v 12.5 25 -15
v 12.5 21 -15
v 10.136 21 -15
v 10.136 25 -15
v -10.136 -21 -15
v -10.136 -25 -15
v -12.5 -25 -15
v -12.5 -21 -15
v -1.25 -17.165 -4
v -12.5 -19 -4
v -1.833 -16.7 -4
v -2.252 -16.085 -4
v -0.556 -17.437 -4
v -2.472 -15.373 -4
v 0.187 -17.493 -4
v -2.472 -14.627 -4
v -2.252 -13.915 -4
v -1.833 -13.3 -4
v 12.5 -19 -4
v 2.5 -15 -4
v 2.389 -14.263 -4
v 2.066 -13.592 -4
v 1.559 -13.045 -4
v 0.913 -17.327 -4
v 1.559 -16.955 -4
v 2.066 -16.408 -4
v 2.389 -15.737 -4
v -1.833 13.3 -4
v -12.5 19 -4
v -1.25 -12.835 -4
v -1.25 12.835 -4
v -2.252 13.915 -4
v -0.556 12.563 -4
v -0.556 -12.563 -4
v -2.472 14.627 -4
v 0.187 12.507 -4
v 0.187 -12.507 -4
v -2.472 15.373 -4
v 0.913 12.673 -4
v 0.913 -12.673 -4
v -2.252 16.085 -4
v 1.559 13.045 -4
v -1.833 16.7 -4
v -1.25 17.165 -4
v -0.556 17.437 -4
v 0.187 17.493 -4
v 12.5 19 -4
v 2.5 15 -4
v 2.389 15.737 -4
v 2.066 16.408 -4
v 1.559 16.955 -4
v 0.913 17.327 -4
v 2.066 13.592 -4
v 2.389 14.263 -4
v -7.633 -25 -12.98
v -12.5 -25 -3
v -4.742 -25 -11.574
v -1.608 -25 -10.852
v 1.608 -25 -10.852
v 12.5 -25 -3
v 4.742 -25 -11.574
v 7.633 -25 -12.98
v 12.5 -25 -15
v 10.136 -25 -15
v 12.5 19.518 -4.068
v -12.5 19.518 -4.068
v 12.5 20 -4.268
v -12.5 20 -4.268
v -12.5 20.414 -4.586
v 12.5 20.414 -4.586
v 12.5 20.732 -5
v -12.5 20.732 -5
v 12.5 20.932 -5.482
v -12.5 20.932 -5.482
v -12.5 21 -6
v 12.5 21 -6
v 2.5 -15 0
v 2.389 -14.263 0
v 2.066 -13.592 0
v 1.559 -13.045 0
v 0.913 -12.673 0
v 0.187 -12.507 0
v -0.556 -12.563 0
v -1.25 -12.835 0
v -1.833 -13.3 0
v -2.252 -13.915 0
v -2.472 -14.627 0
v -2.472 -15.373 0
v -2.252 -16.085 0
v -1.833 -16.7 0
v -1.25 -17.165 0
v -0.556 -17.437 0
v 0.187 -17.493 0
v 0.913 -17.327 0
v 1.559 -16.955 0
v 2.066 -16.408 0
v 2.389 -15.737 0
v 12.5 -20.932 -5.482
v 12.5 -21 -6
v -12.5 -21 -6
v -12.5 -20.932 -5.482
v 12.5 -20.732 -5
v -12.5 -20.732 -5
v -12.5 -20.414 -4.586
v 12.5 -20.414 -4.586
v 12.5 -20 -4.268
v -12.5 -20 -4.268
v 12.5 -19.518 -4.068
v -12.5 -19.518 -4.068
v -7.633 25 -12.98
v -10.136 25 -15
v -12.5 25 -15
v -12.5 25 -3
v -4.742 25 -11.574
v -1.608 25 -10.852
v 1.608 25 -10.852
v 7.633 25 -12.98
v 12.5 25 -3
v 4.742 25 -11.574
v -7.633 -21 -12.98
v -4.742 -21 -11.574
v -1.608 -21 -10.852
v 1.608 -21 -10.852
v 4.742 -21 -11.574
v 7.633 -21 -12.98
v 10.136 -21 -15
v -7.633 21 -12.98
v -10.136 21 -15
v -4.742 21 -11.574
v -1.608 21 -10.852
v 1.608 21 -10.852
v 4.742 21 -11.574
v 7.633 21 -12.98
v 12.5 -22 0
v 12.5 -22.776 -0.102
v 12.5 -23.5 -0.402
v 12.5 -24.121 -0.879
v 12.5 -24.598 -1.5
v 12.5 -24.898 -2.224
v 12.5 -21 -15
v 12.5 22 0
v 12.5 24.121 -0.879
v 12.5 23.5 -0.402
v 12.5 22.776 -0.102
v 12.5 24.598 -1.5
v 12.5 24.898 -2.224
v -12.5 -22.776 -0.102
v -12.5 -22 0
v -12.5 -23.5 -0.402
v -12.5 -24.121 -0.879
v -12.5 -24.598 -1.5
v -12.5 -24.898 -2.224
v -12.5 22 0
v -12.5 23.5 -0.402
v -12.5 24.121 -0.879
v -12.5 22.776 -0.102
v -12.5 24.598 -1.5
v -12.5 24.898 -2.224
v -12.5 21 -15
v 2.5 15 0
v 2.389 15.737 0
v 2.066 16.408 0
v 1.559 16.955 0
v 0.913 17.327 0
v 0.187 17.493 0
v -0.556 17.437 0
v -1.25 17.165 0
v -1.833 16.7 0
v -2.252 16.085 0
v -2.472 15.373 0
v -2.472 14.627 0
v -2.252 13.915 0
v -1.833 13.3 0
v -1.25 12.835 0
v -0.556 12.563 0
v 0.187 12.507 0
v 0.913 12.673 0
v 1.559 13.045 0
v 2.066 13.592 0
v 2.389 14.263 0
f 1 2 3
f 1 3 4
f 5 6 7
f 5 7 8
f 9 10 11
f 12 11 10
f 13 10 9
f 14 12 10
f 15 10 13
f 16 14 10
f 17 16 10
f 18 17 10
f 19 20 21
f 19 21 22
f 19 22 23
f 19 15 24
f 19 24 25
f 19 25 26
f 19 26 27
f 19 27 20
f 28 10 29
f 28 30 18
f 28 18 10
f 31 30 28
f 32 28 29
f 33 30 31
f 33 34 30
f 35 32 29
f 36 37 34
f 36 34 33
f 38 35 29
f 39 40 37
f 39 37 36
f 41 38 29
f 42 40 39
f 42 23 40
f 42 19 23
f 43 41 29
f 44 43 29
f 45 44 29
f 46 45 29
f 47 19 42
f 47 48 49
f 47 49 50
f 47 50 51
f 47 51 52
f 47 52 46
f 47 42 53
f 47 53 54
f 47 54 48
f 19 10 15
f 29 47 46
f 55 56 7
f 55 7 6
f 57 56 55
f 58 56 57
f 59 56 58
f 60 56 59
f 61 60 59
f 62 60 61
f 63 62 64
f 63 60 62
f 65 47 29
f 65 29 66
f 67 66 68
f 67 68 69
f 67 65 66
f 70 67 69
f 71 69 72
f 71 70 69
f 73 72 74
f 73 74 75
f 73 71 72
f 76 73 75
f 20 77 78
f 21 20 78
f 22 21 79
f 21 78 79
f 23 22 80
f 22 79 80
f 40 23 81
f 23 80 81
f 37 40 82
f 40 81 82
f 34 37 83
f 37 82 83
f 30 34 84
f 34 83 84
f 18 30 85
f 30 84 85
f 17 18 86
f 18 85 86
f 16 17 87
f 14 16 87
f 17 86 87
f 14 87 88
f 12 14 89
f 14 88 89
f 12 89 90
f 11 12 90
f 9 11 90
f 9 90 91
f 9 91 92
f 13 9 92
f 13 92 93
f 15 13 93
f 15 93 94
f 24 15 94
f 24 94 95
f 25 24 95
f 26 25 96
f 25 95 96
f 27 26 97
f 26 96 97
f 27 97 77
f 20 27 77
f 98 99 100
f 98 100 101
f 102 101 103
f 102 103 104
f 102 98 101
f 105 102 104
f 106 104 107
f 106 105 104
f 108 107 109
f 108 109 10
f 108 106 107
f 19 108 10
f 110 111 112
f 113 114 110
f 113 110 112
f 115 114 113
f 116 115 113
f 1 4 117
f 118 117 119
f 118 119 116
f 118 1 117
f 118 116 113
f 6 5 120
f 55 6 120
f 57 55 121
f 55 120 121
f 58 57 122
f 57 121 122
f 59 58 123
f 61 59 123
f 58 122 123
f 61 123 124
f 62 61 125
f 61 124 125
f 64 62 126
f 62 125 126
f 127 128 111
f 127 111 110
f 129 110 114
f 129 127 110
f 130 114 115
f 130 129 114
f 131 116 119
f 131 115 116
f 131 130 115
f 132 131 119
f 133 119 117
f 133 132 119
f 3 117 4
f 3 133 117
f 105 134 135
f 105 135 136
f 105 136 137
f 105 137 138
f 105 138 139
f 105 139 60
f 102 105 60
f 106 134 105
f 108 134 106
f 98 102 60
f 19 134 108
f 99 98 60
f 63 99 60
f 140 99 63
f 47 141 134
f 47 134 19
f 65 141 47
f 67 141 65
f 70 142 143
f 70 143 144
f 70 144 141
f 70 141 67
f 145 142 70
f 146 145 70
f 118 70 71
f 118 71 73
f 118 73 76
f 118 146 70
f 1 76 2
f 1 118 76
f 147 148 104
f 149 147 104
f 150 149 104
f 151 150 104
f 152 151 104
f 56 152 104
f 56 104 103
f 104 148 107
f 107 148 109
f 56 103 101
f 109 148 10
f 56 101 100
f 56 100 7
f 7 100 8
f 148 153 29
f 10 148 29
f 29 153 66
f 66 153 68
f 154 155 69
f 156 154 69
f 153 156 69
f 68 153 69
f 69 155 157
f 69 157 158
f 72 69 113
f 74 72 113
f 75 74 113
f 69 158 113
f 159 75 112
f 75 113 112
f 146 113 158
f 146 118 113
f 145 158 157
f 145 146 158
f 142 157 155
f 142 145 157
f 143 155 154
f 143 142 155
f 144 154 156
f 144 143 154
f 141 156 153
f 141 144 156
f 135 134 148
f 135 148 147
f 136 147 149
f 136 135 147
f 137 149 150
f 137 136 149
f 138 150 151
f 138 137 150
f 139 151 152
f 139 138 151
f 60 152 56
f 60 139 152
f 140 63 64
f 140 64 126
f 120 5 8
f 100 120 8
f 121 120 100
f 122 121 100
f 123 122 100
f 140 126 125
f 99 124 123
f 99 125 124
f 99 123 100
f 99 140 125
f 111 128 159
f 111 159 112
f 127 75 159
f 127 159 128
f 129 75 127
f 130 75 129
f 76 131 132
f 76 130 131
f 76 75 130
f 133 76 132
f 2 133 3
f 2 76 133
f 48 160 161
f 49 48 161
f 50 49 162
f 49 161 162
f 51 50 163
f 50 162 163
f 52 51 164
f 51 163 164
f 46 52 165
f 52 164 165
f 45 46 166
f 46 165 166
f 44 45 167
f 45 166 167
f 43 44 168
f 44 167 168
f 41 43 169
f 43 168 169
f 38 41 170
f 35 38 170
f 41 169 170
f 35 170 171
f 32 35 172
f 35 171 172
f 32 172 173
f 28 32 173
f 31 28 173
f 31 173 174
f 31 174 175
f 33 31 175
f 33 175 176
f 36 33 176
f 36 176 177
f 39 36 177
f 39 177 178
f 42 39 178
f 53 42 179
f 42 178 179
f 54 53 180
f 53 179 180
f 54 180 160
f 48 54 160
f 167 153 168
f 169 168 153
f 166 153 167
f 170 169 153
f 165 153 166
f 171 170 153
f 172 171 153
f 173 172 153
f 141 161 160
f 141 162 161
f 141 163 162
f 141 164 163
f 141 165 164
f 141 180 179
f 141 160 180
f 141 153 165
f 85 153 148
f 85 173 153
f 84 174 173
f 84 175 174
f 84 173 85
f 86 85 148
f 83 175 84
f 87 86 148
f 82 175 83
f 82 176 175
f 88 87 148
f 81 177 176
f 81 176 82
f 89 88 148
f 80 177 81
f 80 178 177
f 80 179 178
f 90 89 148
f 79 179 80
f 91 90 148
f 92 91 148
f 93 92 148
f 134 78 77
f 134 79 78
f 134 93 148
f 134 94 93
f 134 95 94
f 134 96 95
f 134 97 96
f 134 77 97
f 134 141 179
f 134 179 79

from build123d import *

# Parameters (mm, degrees)
BOSS_EXTRUDE3_DEPTH     = 12.5
SKETCH2_R               = 2.5
CUT_EXTRUDE3_DEPTH      = 4
SKETCH3_R               = 14.238624177
CUT_EXTRUDE4_DEPTH      = 26
CUT_EXTRUDE4_DEPTH_BACK = 26


with BuildPart() as part:
    # Sketch1 → Boss-Extrude3 (new body, symmetric)
    with BuildSketch(Plane(origin=(0, 0, 0), x_dir=(0, 0, -1), z_dir=(1, 0, 0))):
        with BuildLine():
            Line((0, 22), (0, -22))
            ThreePointArc((0, -22), (0.878679656, -24.121320344), (3, -25))
            Line((3, -25), (15, -25))
            Line((15, -25), (15, -21))
            Line((15, -21), (6, -21))
            ThreePointArc((6, -21), (4.585786438, -20.414213562), (4, -19))
            Line((4, -19), (4, 19))
            ThreePointArc((4, 19), (4.585786438, 20.414213562), (6, 21))
            Line((6, 21), (15, 21))
            Line((15, 21), (15, 25))
            Line((15, 25), (3, 25))
            ThreePointArc((3, 25), (0.878679656, 24.121320344), (0, 22))
        make_face()
    extrude(amount=BOSS_EXTRUDE3_DEPTH, both=True)

    # Sketch2 → Cut-Extrude3 (cut)
    with BuildSketch(Plane.XY):
        with Locations((0, 15)):
            Circle(SKETCH2_R)
        with Locations((0, -15)):
            Circle(SKETCH2_R)
    extrude(amount=-CUT_EXTRUDE3_DEPTH, mode=Mode.SUBTRACT)

    # Sketch3 → Cut-Extrude4 (cut, two sides)
    with BuildSketch(Plane(origin=(0, 0, 0), x_dir=(1, 0, 0), z_dir=(0, 1, 0))) as cut_extrude4_sk:
        with Locations((0, 25)):
            Circle(SKETCH3_R)
    extrude(amount=CUT_EXTRUDE4_DEPTH, mode=Mode.SUBTRACT)
    extrude(cut_extrude4_sk.sketch, amount=-CUT_EXTRUDE4_DEPTH_BACK, mode=Mode.SUBTRACT)


solid = part.part
